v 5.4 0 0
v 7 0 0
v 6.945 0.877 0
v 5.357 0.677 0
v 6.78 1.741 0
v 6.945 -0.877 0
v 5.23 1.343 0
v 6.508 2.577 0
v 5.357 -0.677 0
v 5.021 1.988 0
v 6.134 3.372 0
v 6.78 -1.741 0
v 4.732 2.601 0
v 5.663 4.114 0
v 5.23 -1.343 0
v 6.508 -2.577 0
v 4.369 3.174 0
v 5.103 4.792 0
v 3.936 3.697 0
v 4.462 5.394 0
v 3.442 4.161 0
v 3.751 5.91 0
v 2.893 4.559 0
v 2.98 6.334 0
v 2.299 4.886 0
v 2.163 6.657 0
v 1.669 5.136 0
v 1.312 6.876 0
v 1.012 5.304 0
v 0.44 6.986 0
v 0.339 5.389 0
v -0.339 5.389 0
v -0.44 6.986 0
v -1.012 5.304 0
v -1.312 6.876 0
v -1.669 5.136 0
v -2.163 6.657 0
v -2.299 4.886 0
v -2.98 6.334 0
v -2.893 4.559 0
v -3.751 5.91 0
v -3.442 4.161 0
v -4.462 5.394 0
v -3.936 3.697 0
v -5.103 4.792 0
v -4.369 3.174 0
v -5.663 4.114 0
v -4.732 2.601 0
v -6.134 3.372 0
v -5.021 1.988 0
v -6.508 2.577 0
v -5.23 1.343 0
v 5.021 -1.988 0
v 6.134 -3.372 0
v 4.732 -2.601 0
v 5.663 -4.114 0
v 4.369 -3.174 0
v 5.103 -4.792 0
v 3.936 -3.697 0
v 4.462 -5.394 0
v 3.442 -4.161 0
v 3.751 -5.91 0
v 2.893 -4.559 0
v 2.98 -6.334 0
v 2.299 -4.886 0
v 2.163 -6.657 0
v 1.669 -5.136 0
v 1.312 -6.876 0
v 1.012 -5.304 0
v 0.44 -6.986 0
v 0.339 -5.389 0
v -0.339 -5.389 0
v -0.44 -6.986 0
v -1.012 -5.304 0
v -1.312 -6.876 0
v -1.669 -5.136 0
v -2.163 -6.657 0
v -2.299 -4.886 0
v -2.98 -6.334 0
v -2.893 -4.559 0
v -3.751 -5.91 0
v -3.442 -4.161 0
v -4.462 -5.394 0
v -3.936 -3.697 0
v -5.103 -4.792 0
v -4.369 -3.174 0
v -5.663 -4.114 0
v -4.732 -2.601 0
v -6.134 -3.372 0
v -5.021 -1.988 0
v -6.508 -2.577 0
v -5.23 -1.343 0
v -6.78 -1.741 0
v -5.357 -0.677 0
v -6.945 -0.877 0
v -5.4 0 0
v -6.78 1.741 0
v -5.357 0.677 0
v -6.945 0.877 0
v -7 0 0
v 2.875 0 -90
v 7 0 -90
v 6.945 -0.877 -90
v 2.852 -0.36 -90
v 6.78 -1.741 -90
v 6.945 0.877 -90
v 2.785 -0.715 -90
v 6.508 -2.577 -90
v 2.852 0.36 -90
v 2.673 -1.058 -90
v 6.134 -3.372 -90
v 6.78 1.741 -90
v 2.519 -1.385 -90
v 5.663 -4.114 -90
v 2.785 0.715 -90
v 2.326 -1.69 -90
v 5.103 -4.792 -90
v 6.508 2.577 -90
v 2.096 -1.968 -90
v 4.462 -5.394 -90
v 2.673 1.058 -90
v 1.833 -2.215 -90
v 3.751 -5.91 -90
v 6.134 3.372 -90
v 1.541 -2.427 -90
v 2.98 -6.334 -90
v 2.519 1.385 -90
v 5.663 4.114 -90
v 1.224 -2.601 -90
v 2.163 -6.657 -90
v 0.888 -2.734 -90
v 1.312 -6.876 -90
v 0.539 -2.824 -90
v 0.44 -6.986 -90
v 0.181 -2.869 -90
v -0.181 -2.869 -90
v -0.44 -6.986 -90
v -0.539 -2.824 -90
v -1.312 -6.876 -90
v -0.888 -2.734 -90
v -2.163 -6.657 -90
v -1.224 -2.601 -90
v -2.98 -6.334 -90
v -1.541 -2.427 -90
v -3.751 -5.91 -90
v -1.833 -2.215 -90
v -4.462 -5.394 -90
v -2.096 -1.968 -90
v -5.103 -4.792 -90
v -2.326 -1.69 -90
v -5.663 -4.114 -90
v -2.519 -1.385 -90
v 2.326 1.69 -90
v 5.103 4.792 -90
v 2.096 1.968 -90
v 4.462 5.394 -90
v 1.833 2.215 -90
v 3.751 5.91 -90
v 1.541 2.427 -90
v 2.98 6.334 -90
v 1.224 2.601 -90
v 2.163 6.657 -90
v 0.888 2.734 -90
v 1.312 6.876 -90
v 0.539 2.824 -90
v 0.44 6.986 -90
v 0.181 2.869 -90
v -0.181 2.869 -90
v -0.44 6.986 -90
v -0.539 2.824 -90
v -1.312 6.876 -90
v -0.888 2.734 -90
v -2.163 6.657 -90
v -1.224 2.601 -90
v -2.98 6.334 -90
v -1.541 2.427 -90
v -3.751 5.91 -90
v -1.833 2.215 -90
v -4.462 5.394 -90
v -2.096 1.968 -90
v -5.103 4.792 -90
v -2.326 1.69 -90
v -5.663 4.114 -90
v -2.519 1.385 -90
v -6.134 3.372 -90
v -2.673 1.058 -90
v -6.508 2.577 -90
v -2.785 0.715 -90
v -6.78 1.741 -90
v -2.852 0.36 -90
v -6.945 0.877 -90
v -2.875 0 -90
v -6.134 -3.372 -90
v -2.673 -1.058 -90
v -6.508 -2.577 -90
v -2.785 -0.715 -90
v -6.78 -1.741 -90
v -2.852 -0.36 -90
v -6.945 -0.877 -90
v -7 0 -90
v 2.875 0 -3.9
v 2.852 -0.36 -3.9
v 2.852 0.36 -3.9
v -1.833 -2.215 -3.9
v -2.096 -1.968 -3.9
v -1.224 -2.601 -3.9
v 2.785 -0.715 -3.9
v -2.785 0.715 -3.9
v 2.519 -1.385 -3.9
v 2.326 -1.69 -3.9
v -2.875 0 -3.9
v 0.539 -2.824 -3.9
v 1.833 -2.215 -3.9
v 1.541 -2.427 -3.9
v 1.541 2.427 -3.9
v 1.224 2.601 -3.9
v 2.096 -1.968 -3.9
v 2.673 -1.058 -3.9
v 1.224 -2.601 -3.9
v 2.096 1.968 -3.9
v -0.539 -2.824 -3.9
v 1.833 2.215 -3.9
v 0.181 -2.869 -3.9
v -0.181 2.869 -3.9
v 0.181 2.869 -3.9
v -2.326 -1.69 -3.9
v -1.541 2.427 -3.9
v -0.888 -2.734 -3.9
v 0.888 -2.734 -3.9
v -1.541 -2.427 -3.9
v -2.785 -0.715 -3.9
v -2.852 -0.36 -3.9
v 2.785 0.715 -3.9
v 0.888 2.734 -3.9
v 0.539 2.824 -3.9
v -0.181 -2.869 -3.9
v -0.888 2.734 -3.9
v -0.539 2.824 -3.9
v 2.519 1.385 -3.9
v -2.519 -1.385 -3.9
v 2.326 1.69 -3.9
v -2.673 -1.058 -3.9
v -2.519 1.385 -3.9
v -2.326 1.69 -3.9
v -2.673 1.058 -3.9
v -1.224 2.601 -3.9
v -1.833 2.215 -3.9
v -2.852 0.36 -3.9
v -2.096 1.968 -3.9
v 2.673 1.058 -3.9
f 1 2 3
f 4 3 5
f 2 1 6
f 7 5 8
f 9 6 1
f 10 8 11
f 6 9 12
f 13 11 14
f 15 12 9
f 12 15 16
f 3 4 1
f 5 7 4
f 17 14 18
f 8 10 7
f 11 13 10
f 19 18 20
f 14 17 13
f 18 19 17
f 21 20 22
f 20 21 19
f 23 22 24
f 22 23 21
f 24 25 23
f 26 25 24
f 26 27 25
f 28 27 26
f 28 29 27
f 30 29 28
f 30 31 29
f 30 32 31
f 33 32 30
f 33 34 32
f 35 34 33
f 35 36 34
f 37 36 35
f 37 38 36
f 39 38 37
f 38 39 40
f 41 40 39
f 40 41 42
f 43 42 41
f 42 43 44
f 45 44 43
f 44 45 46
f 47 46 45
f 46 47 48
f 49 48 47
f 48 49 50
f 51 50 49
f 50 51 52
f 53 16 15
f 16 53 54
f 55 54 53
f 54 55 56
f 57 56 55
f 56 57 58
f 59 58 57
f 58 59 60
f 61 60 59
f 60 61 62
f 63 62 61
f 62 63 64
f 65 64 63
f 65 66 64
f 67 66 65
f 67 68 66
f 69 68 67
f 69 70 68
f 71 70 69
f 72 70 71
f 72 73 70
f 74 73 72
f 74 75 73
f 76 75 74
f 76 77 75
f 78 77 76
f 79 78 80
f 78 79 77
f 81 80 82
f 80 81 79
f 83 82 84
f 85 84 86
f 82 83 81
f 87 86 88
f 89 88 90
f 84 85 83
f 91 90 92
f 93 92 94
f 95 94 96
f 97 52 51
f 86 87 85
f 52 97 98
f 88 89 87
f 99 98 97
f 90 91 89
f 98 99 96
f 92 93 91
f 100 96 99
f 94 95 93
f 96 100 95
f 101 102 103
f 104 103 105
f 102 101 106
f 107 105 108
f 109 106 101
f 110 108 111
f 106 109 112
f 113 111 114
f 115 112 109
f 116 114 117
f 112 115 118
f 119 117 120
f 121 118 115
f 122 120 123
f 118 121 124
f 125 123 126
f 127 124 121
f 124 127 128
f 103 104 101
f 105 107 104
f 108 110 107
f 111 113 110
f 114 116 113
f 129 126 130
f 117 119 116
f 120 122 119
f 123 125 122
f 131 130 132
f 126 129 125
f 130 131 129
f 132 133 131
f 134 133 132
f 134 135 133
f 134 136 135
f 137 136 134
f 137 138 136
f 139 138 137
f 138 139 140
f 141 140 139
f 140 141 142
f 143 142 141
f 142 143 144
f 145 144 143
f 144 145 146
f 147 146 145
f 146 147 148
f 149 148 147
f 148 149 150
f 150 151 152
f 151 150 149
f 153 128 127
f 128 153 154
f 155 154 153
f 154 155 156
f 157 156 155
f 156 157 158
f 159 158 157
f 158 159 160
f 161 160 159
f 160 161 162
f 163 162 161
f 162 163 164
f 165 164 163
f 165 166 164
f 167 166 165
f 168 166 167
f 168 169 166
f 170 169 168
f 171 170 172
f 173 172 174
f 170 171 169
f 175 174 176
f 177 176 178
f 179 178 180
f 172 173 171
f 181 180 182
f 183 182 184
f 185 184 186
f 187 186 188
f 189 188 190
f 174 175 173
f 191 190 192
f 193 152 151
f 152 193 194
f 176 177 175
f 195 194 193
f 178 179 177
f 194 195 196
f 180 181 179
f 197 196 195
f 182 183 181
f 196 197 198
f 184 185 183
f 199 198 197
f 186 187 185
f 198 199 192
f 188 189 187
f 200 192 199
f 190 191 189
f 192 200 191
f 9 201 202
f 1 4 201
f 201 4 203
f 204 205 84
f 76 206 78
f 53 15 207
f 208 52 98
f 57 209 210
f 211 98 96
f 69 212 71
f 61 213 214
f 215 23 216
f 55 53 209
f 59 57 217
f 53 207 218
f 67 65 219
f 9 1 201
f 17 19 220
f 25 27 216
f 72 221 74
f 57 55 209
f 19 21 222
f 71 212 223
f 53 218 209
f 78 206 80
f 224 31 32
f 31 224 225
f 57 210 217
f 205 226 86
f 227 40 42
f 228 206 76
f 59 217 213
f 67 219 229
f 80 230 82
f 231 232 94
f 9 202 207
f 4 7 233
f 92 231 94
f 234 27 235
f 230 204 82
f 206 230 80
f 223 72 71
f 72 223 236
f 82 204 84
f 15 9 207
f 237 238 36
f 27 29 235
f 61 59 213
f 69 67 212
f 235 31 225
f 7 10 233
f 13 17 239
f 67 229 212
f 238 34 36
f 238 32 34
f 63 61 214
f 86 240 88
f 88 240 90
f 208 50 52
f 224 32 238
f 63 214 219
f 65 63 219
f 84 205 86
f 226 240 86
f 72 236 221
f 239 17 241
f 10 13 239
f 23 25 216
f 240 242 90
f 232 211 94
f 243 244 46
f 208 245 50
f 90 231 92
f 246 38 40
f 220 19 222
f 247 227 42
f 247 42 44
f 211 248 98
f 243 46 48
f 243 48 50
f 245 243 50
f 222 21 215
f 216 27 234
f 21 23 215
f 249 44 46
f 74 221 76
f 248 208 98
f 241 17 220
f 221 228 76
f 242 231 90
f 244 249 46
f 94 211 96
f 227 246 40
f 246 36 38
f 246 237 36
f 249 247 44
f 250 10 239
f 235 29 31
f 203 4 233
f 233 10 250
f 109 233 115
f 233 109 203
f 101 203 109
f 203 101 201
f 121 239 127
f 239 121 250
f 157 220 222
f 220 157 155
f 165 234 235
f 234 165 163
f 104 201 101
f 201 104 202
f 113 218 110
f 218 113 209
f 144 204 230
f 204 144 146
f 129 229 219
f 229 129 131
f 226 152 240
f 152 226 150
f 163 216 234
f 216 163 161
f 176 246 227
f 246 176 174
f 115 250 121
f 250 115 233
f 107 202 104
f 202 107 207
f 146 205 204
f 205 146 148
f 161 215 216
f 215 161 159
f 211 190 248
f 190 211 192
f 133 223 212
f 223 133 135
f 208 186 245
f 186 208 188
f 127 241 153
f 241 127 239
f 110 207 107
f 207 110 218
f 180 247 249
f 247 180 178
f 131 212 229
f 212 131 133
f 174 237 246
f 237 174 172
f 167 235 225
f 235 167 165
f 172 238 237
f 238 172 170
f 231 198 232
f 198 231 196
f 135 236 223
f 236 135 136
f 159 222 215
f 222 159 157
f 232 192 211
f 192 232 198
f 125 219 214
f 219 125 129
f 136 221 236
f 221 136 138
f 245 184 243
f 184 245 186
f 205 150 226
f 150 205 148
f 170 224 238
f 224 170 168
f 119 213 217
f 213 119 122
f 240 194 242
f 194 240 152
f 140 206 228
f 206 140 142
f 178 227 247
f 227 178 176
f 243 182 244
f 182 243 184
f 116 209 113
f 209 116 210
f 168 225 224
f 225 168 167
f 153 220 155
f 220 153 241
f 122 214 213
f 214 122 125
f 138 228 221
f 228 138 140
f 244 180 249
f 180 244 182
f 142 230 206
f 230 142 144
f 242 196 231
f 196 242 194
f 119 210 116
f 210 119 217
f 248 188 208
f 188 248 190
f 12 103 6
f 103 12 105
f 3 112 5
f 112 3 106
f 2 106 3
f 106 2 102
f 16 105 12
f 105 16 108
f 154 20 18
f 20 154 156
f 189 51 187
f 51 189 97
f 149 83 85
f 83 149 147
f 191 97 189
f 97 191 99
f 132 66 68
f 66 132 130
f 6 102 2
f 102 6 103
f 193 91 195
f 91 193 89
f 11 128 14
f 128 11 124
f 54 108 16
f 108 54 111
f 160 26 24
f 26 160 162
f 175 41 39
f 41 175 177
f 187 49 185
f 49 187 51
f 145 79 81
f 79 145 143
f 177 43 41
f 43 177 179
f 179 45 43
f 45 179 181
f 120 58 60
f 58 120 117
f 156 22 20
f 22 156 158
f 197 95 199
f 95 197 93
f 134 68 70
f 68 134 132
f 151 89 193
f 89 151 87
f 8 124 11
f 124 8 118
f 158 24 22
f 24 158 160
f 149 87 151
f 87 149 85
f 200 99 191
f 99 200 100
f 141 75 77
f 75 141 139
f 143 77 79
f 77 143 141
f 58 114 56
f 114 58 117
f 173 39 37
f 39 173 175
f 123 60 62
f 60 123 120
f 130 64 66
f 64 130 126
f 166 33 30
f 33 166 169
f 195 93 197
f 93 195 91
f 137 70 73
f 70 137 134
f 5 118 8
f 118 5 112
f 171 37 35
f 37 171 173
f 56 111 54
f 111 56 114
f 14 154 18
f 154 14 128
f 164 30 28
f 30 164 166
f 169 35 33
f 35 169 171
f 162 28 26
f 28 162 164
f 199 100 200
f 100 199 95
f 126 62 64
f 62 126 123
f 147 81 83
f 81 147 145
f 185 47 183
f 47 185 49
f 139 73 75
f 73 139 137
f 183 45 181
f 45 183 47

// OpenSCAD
$fn = 50;


difference() {
	union() {
		translate(v = [0, 0, -90.0000000000]) {
			cylinder(h = 90, r = 7.0000000000);
		}
	}
	union() {
		translate(v = [0, 0, 0]) {
			rotate(a = [0, 0, 0]) {
				difference() {
					union() {
						#translate(v = [0, 0, -90.0000000000]) {
							cylinder(h = 90, r = 2.6000000000);
						}
						#translate(v = [0, 0, -3.9000000000]) {
							cylinder(h = 3.9000000000, r1 = 2.8750000000, r2 = 5.4000000000);
						}
						#translate(v = [0, 0, -90.0000000000]) {
							cylinder(h = 90, r = 2.8750000000);
						}
						#translate(v = [0, 0, -90.0000000000]) {
							cylinder(h = 90, r = 2.6000000000);
						}
					}
					union();
				}
			}
		}
	}
}
